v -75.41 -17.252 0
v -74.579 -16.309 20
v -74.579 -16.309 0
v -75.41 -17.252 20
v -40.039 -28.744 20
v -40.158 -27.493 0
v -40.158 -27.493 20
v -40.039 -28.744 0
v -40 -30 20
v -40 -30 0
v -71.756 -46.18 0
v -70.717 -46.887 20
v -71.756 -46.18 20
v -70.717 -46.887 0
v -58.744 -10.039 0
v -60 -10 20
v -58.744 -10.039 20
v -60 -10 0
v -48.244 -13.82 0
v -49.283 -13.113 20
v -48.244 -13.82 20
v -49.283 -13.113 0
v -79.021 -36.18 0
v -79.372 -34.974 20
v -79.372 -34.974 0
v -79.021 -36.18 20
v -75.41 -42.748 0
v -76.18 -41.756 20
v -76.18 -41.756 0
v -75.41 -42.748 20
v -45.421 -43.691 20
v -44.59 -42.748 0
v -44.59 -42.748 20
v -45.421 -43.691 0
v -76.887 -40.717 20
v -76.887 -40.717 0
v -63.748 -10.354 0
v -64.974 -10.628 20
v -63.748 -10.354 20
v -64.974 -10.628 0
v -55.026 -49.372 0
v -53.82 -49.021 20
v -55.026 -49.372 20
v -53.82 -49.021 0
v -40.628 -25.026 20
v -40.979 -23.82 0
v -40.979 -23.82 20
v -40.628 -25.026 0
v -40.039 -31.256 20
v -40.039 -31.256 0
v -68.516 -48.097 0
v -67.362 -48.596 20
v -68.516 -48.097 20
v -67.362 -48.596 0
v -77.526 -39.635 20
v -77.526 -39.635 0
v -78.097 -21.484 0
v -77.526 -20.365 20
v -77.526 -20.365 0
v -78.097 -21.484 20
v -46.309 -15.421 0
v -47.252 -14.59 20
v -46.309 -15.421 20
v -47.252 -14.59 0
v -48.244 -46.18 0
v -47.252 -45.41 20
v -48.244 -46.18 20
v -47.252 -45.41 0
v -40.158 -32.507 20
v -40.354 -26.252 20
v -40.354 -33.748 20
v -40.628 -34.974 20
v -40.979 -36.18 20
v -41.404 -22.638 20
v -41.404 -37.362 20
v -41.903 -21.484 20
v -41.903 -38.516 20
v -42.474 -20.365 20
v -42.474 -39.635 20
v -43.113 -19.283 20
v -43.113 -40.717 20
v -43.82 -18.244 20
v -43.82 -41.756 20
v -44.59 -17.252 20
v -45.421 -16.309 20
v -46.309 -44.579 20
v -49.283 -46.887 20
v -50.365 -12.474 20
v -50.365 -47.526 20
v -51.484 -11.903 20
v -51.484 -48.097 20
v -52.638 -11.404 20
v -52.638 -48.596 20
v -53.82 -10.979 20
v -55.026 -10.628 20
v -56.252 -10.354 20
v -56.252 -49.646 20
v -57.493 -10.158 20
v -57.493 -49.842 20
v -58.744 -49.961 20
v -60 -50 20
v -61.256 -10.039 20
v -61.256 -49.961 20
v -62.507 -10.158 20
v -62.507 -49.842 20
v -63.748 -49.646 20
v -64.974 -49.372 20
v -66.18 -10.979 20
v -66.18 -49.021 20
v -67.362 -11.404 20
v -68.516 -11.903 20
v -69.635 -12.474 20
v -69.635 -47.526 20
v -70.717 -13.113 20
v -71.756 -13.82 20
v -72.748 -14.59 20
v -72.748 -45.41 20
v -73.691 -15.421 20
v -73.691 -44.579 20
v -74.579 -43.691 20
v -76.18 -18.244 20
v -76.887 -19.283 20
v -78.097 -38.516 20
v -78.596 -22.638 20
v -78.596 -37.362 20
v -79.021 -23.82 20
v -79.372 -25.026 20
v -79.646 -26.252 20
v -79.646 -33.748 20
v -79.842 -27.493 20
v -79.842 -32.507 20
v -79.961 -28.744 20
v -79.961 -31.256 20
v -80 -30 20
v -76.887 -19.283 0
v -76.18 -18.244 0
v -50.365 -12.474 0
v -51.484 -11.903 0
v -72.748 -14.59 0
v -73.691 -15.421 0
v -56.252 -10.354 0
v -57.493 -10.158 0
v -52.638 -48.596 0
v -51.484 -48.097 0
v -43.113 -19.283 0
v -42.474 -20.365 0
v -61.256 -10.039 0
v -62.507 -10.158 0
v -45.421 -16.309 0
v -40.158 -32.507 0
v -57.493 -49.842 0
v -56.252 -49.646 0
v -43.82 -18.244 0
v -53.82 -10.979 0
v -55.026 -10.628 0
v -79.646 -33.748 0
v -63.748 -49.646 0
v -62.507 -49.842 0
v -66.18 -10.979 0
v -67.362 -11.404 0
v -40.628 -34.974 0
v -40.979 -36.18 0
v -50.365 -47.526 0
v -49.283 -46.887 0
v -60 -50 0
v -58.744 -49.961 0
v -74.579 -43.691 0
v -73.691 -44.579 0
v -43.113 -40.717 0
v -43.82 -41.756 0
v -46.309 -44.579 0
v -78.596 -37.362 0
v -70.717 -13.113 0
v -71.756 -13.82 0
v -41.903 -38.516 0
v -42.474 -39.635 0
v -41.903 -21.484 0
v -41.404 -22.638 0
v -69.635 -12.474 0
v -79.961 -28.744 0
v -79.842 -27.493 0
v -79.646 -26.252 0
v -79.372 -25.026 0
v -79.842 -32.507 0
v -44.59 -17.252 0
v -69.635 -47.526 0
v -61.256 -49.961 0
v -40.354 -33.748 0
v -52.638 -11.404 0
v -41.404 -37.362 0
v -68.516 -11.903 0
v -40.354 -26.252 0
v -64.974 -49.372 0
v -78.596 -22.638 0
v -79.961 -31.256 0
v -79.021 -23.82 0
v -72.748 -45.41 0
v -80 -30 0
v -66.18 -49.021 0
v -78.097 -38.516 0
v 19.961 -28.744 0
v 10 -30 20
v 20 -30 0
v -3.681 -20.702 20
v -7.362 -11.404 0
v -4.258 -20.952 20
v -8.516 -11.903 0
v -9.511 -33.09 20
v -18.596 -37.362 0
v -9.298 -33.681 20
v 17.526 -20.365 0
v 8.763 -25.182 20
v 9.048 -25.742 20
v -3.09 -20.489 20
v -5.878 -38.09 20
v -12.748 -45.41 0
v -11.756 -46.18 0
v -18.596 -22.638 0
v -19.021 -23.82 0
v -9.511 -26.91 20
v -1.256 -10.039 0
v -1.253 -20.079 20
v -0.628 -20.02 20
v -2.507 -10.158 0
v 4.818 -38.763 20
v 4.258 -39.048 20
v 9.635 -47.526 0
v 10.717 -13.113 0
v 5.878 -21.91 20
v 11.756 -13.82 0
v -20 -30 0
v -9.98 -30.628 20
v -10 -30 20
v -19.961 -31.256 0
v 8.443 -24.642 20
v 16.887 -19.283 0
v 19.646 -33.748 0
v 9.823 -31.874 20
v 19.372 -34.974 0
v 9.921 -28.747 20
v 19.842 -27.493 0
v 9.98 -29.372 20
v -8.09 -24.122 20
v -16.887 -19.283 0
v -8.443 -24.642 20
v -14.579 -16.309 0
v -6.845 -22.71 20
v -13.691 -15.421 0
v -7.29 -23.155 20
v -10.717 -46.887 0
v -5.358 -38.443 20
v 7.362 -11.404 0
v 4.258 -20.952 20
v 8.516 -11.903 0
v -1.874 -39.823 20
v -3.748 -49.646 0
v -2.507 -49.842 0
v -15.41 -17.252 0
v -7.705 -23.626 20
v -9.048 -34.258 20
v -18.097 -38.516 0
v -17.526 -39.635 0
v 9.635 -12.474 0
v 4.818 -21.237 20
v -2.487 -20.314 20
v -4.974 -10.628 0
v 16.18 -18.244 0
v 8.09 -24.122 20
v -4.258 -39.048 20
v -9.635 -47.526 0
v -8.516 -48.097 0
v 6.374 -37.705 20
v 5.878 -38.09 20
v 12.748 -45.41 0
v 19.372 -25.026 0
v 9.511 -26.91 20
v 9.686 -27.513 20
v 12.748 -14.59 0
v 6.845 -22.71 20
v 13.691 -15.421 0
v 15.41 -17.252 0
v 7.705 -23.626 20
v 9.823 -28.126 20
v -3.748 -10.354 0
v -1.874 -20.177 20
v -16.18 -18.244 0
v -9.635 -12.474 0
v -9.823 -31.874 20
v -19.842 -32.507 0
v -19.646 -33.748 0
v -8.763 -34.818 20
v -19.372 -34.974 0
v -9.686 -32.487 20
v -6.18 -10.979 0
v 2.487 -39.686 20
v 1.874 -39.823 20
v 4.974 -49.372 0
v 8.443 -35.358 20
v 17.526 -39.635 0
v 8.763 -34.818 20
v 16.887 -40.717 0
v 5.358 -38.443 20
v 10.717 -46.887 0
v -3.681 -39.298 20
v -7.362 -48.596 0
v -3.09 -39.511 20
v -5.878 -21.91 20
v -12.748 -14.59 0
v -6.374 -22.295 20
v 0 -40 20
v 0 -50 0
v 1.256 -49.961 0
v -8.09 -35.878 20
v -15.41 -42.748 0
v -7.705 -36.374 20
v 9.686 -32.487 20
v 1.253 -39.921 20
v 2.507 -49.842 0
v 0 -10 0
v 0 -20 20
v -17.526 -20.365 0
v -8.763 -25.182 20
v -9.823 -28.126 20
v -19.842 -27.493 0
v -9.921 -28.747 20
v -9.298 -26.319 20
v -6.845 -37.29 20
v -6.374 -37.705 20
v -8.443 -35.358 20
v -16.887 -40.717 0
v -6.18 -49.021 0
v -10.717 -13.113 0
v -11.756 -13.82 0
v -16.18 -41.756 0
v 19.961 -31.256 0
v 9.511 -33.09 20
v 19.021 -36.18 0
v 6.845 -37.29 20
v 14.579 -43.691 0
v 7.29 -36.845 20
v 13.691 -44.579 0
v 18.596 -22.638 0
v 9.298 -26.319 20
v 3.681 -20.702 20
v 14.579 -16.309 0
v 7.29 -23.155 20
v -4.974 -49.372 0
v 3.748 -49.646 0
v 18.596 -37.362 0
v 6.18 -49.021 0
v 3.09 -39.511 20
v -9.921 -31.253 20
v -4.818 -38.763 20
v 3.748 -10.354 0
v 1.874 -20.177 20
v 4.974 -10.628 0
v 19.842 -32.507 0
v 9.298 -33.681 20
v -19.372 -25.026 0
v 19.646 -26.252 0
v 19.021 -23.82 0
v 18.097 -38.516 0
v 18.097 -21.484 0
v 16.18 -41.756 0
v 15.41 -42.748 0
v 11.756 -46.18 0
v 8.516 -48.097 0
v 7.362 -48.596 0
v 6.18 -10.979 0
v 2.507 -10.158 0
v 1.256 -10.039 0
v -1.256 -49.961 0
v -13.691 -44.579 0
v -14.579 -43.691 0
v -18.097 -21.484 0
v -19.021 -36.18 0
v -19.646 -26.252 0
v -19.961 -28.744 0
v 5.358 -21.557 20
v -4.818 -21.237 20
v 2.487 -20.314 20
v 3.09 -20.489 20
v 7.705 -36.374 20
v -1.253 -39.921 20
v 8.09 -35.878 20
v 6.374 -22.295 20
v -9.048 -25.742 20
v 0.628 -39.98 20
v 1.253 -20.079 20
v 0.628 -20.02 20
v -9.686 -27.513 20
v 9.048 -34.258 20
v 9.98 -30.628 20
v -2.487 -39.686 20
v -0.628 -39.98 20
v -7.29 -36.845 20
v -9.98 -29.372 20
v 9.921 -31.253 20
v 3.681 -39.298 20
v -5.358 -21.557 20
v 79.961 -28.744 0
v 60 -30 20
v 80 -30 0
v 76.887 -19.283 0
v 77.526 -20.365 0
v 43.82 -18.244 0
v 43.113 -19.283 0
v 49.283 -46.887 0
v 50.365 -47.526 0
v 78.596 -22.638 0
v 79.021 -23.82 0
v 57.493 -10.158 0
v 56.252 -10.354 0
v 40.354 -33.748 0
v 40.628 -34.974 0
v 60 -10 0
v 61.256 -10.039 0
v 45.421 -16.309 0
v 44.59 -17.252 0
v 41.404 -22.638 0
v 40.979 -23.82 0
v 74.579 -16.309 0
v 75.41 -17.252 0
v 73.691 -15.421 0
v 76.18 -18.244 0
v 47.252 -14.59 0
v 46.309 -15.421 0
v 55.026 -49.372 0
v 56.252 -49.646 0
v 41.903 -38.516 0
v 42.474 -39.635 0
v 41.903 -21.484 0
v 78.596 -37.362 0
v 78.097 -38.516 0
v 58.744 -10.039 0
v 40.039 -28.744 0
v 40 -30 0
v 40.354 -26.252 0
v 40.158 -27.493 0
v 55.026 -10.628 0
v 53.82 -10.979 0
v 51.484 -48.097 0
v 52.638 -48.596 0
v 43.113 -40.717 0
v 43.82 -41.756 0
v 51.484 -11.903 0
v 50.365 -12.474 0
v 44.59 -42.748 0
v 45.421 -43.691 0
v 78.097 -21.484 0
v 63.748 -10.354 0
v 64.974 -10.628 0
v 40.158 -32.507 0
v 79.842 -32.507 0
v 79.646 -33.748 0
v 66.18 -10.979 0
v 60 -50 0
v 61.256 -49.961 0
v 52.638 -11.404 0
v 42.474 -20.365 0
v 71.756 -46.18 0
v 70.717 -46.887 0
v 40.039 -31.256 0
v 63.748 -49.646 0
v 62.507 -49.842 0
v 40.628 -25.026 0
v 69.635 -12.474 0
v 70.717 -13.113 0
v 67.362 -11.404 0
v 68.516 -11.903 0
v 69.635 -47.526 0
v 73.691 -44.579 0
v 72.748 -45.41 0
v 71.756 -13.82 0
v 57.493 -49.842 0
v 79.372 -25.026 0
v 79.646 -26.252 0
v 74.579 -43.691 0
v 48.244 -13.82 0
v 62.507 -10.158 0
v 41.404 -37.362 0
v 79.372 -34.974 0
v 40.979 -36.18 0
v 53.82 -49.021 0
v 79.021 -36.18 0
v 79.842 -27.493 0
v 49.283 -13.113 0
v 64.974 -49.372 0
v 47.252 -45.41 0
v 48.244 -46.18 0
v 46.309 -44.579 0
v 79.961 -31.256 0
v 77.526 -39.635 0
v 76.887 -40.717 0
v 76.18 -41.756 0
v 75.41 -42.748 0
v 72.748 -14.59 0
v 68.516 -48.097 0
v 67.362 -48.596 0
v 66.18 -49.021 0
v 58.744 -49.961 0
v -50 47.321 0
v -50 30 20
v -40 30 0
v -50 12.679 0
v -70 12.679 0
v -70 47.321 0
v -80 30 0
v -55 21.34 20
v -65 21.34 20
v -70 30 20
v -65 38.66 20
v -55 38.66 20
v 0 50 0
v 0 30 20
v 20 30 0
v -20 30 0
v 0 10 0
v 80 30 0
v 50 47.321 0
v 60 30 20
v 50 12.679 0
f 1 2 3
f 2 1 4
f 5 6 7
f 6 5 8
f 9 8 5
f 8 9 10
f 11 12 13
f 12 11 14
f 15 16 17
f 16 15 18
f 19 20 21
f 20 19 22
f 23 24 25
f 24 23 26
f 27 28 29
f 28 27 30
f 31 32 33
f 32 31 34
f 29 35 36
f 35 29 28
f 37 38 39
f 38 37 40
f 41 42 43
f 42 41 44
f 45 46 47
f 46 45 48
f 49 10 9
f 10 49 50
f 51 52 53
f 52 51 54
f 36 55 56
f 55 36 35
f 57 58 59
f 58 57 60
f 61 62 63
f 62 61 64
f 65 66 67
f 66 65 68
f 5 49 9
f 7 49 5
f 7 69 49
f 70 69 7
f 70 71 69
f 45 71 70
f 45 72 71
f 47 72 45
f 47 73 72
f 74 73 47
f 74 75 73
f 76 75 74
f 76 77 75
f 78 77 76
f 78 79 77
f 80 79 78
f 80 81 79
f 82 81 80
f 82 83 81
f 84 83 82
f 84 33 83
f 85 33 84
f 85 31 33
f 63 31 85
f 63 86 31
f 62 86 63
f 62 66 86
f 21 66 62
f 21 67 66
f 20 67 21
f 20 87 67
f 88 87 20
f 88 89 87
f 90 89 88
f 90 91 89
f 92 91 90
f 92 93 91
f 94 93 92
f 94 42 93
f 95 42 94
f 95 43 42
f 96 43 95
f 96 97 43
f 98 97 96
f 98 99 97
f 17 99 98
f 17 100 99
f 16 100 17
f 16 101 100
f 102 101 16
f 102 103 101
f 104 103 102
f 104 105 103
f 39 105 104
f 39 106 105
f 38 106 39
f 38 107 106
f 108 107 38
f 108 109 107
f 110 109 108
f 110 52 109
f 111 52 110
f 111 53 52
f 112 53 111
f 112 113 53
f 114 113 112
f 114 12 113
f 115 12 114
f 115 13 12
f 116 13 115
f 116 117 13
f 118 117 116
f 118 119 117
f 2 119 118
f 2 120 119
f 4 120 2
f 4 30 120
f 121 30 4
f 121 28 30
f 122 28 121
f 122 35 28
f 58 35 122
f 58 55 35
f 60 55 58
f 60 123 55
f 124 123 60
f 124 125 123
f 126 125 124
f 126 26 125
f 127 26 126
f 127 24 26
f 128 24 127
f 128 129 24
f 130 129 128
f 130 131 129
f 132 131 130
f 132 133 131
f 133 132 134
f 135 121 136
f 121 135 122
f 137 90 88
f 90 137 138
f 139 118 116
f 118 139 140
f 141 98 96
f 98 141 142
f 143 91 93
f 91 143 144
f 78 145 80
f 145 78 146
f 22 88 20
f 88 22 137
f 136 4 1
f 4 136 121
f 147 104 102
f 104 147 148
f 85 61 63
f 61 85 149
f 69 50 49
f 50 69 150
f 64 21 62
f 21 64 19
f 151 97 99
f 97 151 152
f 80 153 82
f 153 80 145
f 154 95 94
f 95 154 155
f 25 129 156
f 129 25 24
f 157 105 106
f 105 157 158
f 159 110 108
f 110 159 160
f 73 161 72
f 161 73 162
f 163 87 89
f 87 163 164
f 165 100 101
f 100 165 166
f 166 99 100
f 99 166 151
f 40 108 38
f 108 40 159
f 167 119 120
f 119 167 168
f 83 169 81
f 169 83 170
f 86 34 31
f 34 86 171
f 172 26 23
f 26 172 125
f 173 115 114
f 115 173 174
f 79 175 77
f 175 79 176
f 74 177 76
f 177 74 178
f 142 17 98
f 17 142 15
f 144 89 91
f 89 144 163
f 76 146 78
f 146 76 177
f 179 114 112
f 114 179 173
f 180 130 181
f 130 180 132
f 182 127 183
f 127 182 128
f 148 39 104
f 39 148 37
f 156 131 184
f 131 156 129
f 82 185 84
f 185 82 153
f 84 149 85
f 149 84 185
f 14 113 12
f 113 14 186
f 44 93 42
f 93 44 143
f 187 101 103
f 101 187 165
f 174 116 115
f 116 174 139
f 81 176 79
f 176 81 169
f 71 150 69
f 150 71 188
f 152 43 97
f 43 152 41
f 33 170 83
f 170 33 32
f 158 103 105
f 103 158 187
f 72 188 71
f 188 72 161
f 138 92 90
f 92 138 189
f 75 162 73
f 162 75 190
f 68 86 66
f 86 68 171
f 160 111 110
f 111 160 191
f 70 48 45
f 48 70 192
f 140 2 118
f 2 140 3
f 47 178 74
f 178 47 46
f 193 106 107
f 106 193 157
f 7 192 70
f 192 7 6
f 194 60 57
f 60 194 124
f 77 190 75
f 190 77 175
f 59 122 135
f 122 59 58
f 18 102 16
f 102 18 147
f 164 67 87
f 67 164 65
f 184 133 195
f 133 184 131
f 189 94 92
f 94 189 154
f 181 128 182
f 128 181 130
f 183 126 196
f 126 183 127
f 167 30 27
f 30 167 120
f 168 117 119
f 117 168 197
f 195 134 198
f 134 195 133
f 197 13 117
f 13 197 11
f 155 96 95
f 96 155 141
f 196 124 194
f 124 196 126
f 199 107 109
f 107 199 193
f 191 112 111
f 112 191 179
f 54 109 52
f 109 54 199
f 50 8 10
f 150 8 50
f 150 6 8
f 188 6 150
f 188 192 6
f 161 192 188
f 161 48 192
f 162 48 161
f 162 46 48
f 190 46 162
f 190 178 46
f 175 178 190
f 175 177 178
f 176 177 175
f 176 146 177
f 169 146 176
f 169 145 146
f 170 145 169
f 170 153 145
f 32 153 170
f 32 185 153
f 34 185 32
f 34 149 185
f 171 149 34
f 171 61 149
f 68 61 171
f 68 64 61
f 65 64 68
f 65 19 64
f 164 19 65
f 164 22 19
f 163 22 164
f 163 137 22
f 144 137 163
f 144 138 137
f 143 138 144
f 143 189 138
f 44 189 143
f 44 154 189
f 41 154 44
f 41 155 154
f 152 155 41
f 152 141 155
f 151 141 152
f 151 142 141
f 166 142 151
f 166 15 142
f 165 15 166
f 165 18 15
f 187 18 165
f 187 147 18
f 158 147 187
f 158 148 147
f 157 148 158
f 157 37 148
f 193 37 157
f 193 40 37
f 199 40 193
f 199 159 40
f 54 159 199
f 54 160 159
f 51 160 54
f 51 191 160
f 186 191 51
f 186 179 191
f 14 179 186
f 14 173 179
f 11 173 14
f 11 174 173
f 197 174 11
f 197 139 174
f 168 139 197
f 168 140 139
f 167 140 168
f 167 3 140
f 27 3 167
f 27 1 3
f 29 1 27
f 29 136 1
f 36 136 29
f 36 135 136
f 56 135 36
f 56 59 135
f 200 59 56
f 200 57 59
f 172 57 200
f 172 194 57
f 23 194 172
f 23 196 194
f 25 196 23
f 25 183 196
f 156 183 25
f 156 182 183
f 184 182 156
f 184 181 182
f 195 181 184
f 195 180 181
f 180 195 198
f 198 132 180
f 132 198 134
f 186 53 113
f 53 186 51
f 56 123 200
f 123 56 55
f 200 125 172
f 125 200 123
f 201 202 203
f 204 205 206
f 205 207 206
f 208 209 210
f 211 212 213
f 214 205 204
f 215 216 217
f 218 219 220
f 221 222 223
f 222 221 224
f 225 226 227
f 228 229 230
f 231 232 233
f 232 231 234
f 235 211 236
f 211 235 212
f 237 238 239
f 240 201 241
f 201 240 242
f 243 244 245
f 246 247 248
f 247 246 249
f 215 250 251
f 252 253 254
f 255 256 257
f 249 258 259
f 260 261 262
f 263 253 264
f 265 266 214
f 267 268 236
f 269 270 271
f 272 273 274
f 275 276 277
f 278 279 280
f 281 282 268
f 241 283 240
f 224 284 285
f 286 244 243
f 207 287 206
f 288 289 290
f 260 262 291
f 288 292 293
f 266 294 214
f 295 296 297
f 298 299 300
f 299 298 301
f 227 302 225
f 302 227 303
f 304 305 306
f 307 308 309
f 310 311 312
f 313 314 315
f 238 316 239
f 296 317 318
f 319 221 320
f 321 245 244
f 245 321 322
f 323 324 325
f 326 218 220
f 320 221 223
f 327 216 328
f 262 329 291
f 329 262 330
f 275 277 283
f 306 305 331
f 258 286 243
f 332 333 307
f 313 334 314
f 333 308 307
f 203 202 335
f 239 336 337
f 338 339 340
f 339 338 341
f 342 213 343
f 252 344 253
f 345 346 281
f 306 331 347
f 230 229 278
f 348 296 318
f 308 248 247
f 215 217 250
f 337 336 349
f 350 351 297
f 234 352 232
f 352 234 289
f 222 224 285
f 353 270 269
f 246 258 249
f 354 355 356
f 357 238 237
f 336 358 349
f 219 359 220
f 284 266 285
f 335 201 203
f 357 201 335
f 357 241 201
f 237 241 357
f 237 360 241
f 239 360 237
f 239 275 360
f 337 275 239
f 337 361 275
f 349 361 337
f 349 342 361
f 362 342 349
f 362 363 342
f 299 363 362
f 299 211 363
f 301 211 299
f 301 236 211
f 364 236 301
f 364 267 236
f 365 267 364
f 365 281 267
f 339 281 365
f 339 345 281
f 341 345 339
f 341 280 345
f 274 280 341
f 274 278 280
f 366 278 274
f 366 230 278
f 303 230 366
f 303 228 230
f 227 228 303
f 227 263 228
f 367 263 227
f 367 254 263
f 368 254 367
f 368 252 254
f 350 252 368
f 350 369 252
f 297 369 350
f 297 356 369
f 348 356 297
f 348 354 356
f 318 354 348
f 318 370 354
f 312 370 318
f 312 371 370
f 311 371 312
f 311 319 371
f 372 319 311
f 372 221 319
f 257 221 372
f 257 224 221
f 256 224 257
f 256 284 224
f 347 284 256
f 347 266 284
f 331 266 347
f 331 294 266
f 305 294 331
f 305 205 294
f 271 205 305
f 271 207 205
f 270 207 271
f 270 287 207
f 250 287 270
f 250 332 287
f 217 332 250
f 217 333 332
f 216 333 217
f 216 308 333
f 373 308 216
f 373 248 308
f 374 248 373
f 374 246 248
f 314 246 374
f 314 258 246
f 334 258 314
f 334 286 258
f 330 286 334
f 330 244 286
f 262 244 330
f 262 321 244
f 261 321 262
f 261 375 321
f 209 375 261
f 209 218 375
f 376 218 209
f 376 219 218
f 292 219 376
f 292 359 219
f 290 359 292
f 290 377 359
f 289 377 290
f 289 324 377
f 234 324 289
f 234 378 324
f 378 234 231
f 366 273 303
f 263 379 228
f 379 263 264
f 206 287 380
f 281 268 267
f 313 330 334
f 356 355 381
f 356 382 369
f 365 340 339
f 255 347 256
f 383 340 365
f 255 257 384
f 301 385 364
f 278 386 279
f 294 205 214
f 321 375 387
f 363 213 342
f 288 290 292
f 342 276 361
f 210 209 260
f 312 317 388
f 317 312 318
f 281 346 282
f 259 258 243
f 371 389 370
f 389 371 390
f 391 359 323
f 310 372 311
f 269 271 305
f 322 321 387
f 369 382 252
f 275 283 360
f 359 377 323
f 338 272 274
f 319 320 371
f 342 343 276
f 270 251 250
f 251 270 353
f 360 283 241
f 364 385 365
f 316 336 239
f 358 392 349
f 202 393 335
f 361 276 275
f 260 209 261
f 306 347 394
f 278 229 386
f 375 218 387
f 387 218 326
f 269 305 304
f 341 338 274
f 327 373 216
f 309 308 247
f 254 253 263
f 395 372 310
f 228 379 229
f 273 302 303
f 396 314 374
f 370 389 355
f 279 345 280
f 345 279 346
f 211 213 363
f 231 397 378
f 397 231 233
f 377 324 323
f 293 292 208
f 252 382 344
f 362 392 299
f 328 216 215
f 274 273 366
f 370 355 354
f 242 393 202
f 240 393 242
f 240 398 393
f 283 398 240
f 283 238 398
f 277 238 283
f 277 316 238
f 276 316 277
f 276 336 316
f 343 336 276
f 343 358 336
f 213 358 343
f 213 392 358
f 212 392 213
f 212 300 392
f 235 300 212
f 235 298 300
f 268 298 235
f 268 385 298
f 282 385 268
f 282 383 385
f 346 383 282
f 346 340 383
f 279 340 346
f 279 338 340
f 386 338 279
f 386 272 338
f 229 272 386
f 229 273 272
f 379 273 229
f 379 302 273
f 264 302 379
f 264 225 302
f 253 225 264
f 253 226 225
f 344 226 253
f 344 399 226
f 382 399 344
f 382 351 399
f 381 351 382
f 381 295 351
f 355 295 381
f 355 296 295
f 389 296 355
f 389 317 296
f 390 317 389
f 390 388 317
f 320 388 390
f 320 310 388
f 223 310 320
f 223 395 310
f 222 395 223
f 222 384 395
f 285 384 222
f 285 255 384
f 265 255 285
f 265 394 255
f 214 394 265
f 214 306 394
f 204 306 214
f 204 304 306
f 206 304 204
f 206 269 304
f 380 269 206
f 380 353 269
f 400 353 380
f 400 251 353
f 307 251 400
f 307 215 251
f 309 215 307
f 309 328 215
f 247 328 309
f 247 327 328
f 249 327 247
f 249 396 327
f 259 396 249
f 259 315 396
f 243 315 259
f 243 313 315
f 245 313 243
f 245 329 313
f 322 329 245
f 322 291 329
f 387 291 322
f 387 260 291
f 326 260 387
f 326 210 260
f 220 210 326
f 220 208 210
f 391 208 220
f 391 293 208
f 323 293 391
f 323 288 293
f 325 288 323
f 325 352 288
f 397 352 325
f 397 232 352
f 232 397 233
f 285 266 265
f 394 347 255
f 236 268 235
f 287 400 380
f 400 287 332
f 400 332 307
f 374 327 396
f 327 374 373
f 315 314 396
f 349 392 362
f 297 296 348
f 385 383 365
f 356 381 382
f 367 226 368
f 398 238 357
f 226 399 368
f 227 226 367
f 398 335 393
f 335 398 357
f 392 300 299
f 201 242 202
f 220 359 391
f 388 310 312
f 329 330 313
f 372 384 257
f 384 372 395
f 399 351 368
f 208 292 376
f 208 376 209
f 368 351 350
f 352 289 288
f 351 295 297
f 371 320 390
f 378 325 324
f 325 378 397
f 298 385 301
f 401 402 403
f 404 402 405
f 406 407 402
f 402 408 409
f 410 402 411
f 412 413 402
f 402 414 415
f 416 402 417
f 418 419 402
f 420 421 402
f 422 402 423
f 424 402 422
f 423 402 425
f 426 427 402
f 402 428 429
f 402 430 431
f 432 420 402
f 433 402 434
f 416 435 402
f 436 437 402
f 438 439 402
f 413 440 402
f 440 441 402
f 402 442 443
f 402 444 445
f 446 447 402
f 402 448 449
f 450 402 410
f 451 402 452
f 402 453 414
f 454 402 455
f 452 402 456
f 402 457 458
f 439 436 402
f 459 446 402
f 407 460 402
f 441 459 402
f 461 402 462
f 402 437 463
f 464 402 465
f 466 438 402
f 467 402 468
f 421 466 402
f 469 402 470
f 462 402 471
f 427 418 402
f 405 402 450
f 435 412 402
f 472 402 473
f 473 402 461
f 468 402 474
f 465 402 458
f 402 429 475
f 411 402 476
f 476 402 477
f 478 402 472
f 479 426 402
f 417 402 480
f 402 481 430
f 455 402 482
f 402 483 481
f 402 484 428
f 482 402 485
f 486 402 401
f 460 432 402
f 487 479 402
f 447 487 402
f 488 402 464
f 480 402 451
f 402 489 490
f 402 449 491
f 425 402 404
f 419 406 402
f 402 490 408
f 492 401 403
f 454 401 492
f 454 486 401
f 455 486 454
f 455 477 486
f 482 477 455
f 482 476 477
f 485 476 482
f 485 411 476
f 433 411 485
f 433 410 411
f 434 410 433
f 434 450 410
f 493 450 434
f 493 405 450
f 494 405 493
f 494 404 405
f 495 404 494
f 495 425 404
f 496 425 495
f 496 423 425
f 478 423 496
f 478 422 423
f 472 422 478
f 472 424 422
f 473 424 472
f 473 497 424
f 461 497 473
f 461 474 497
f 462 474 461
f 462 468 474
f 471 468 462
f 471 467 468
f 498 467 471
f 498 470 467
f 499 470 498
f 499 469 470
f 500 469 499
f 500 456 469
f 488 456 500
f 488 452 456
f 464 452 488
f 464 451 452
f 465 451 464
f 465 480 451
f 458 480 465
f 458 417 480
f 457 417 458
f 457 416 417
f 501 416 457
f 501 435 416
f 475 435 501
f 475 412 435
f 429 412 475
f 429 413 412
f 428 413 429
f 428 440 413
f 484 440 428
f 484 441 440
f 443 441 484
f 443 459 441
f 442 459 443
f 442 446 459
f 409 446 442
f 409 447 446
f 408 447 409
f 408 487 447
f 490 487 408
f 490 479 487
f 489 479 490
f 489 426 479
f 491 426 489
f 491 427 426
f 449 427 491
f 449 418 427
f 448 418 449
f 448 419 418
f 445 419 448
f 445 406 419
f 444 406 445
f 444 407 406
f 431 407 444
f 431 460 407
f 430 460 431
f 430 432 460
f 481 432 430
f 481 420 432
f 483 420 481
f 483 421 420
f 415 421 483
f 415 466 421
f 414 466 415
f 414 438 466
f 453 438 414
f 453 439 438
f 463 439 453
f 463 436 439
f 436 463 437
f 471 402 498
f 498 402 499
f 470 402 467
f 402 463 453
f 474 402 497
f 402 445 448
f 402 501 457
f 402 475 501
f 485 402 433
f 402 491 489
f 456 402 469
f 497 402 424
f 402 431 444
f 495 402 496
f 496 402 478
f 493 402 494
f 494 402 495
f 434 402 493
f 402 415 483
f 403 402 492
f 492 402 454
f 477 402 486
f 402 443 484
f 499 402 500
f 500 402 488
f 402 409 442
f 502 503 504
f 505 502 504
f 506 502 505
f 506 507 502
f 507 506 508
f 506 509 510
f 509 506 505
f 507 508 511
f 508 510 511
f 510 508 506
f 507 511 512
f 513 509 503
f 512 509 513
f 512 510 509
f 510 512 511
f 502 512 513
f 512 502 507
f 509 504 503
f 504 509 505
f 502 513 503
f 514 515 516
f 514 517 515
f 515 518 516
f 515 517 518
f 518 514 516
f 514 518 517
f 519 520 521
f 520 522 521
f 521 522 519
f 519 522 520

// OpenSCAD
//-- Dimensiones de los cuadros de la cuadricula
d = 60;

//-- Centrar la cuadricula (opcional)
translate([-2*d / 2, -d / 2, 0]) {

  //-- Punto: 0, 0
  translate([0, 0, 0]) cylinder (r = 20, h = 20, $fn = 100);

  //-- Punto: 1, 0
  translate([d, 0, 0]) cylinder (r1 = 20, r2 = 10, h = 20, $fn = 100);

  //-- Punto: 2, 0
  translate([2*d, 0, 0]) cylinder (r1 = 20, r2 = 0, h = 20, $fn = 100);

  //-- Punto: 0, 1
  translate([0, d, 0])  cylinder (r1 = 20, r2 = 10, h = 20, $fn = 6);

  //-- Punto: 1, 1
  translate([d, d, 0])  cylinder (r1 = 20, r2 = 0, h = 20, $fn = 4);

  //-- Punto: 2, 1
  translate([2*d, d, 0]) cylinder (r1 = 20, r2 = 0, h = 20, $fn = 3);

}
